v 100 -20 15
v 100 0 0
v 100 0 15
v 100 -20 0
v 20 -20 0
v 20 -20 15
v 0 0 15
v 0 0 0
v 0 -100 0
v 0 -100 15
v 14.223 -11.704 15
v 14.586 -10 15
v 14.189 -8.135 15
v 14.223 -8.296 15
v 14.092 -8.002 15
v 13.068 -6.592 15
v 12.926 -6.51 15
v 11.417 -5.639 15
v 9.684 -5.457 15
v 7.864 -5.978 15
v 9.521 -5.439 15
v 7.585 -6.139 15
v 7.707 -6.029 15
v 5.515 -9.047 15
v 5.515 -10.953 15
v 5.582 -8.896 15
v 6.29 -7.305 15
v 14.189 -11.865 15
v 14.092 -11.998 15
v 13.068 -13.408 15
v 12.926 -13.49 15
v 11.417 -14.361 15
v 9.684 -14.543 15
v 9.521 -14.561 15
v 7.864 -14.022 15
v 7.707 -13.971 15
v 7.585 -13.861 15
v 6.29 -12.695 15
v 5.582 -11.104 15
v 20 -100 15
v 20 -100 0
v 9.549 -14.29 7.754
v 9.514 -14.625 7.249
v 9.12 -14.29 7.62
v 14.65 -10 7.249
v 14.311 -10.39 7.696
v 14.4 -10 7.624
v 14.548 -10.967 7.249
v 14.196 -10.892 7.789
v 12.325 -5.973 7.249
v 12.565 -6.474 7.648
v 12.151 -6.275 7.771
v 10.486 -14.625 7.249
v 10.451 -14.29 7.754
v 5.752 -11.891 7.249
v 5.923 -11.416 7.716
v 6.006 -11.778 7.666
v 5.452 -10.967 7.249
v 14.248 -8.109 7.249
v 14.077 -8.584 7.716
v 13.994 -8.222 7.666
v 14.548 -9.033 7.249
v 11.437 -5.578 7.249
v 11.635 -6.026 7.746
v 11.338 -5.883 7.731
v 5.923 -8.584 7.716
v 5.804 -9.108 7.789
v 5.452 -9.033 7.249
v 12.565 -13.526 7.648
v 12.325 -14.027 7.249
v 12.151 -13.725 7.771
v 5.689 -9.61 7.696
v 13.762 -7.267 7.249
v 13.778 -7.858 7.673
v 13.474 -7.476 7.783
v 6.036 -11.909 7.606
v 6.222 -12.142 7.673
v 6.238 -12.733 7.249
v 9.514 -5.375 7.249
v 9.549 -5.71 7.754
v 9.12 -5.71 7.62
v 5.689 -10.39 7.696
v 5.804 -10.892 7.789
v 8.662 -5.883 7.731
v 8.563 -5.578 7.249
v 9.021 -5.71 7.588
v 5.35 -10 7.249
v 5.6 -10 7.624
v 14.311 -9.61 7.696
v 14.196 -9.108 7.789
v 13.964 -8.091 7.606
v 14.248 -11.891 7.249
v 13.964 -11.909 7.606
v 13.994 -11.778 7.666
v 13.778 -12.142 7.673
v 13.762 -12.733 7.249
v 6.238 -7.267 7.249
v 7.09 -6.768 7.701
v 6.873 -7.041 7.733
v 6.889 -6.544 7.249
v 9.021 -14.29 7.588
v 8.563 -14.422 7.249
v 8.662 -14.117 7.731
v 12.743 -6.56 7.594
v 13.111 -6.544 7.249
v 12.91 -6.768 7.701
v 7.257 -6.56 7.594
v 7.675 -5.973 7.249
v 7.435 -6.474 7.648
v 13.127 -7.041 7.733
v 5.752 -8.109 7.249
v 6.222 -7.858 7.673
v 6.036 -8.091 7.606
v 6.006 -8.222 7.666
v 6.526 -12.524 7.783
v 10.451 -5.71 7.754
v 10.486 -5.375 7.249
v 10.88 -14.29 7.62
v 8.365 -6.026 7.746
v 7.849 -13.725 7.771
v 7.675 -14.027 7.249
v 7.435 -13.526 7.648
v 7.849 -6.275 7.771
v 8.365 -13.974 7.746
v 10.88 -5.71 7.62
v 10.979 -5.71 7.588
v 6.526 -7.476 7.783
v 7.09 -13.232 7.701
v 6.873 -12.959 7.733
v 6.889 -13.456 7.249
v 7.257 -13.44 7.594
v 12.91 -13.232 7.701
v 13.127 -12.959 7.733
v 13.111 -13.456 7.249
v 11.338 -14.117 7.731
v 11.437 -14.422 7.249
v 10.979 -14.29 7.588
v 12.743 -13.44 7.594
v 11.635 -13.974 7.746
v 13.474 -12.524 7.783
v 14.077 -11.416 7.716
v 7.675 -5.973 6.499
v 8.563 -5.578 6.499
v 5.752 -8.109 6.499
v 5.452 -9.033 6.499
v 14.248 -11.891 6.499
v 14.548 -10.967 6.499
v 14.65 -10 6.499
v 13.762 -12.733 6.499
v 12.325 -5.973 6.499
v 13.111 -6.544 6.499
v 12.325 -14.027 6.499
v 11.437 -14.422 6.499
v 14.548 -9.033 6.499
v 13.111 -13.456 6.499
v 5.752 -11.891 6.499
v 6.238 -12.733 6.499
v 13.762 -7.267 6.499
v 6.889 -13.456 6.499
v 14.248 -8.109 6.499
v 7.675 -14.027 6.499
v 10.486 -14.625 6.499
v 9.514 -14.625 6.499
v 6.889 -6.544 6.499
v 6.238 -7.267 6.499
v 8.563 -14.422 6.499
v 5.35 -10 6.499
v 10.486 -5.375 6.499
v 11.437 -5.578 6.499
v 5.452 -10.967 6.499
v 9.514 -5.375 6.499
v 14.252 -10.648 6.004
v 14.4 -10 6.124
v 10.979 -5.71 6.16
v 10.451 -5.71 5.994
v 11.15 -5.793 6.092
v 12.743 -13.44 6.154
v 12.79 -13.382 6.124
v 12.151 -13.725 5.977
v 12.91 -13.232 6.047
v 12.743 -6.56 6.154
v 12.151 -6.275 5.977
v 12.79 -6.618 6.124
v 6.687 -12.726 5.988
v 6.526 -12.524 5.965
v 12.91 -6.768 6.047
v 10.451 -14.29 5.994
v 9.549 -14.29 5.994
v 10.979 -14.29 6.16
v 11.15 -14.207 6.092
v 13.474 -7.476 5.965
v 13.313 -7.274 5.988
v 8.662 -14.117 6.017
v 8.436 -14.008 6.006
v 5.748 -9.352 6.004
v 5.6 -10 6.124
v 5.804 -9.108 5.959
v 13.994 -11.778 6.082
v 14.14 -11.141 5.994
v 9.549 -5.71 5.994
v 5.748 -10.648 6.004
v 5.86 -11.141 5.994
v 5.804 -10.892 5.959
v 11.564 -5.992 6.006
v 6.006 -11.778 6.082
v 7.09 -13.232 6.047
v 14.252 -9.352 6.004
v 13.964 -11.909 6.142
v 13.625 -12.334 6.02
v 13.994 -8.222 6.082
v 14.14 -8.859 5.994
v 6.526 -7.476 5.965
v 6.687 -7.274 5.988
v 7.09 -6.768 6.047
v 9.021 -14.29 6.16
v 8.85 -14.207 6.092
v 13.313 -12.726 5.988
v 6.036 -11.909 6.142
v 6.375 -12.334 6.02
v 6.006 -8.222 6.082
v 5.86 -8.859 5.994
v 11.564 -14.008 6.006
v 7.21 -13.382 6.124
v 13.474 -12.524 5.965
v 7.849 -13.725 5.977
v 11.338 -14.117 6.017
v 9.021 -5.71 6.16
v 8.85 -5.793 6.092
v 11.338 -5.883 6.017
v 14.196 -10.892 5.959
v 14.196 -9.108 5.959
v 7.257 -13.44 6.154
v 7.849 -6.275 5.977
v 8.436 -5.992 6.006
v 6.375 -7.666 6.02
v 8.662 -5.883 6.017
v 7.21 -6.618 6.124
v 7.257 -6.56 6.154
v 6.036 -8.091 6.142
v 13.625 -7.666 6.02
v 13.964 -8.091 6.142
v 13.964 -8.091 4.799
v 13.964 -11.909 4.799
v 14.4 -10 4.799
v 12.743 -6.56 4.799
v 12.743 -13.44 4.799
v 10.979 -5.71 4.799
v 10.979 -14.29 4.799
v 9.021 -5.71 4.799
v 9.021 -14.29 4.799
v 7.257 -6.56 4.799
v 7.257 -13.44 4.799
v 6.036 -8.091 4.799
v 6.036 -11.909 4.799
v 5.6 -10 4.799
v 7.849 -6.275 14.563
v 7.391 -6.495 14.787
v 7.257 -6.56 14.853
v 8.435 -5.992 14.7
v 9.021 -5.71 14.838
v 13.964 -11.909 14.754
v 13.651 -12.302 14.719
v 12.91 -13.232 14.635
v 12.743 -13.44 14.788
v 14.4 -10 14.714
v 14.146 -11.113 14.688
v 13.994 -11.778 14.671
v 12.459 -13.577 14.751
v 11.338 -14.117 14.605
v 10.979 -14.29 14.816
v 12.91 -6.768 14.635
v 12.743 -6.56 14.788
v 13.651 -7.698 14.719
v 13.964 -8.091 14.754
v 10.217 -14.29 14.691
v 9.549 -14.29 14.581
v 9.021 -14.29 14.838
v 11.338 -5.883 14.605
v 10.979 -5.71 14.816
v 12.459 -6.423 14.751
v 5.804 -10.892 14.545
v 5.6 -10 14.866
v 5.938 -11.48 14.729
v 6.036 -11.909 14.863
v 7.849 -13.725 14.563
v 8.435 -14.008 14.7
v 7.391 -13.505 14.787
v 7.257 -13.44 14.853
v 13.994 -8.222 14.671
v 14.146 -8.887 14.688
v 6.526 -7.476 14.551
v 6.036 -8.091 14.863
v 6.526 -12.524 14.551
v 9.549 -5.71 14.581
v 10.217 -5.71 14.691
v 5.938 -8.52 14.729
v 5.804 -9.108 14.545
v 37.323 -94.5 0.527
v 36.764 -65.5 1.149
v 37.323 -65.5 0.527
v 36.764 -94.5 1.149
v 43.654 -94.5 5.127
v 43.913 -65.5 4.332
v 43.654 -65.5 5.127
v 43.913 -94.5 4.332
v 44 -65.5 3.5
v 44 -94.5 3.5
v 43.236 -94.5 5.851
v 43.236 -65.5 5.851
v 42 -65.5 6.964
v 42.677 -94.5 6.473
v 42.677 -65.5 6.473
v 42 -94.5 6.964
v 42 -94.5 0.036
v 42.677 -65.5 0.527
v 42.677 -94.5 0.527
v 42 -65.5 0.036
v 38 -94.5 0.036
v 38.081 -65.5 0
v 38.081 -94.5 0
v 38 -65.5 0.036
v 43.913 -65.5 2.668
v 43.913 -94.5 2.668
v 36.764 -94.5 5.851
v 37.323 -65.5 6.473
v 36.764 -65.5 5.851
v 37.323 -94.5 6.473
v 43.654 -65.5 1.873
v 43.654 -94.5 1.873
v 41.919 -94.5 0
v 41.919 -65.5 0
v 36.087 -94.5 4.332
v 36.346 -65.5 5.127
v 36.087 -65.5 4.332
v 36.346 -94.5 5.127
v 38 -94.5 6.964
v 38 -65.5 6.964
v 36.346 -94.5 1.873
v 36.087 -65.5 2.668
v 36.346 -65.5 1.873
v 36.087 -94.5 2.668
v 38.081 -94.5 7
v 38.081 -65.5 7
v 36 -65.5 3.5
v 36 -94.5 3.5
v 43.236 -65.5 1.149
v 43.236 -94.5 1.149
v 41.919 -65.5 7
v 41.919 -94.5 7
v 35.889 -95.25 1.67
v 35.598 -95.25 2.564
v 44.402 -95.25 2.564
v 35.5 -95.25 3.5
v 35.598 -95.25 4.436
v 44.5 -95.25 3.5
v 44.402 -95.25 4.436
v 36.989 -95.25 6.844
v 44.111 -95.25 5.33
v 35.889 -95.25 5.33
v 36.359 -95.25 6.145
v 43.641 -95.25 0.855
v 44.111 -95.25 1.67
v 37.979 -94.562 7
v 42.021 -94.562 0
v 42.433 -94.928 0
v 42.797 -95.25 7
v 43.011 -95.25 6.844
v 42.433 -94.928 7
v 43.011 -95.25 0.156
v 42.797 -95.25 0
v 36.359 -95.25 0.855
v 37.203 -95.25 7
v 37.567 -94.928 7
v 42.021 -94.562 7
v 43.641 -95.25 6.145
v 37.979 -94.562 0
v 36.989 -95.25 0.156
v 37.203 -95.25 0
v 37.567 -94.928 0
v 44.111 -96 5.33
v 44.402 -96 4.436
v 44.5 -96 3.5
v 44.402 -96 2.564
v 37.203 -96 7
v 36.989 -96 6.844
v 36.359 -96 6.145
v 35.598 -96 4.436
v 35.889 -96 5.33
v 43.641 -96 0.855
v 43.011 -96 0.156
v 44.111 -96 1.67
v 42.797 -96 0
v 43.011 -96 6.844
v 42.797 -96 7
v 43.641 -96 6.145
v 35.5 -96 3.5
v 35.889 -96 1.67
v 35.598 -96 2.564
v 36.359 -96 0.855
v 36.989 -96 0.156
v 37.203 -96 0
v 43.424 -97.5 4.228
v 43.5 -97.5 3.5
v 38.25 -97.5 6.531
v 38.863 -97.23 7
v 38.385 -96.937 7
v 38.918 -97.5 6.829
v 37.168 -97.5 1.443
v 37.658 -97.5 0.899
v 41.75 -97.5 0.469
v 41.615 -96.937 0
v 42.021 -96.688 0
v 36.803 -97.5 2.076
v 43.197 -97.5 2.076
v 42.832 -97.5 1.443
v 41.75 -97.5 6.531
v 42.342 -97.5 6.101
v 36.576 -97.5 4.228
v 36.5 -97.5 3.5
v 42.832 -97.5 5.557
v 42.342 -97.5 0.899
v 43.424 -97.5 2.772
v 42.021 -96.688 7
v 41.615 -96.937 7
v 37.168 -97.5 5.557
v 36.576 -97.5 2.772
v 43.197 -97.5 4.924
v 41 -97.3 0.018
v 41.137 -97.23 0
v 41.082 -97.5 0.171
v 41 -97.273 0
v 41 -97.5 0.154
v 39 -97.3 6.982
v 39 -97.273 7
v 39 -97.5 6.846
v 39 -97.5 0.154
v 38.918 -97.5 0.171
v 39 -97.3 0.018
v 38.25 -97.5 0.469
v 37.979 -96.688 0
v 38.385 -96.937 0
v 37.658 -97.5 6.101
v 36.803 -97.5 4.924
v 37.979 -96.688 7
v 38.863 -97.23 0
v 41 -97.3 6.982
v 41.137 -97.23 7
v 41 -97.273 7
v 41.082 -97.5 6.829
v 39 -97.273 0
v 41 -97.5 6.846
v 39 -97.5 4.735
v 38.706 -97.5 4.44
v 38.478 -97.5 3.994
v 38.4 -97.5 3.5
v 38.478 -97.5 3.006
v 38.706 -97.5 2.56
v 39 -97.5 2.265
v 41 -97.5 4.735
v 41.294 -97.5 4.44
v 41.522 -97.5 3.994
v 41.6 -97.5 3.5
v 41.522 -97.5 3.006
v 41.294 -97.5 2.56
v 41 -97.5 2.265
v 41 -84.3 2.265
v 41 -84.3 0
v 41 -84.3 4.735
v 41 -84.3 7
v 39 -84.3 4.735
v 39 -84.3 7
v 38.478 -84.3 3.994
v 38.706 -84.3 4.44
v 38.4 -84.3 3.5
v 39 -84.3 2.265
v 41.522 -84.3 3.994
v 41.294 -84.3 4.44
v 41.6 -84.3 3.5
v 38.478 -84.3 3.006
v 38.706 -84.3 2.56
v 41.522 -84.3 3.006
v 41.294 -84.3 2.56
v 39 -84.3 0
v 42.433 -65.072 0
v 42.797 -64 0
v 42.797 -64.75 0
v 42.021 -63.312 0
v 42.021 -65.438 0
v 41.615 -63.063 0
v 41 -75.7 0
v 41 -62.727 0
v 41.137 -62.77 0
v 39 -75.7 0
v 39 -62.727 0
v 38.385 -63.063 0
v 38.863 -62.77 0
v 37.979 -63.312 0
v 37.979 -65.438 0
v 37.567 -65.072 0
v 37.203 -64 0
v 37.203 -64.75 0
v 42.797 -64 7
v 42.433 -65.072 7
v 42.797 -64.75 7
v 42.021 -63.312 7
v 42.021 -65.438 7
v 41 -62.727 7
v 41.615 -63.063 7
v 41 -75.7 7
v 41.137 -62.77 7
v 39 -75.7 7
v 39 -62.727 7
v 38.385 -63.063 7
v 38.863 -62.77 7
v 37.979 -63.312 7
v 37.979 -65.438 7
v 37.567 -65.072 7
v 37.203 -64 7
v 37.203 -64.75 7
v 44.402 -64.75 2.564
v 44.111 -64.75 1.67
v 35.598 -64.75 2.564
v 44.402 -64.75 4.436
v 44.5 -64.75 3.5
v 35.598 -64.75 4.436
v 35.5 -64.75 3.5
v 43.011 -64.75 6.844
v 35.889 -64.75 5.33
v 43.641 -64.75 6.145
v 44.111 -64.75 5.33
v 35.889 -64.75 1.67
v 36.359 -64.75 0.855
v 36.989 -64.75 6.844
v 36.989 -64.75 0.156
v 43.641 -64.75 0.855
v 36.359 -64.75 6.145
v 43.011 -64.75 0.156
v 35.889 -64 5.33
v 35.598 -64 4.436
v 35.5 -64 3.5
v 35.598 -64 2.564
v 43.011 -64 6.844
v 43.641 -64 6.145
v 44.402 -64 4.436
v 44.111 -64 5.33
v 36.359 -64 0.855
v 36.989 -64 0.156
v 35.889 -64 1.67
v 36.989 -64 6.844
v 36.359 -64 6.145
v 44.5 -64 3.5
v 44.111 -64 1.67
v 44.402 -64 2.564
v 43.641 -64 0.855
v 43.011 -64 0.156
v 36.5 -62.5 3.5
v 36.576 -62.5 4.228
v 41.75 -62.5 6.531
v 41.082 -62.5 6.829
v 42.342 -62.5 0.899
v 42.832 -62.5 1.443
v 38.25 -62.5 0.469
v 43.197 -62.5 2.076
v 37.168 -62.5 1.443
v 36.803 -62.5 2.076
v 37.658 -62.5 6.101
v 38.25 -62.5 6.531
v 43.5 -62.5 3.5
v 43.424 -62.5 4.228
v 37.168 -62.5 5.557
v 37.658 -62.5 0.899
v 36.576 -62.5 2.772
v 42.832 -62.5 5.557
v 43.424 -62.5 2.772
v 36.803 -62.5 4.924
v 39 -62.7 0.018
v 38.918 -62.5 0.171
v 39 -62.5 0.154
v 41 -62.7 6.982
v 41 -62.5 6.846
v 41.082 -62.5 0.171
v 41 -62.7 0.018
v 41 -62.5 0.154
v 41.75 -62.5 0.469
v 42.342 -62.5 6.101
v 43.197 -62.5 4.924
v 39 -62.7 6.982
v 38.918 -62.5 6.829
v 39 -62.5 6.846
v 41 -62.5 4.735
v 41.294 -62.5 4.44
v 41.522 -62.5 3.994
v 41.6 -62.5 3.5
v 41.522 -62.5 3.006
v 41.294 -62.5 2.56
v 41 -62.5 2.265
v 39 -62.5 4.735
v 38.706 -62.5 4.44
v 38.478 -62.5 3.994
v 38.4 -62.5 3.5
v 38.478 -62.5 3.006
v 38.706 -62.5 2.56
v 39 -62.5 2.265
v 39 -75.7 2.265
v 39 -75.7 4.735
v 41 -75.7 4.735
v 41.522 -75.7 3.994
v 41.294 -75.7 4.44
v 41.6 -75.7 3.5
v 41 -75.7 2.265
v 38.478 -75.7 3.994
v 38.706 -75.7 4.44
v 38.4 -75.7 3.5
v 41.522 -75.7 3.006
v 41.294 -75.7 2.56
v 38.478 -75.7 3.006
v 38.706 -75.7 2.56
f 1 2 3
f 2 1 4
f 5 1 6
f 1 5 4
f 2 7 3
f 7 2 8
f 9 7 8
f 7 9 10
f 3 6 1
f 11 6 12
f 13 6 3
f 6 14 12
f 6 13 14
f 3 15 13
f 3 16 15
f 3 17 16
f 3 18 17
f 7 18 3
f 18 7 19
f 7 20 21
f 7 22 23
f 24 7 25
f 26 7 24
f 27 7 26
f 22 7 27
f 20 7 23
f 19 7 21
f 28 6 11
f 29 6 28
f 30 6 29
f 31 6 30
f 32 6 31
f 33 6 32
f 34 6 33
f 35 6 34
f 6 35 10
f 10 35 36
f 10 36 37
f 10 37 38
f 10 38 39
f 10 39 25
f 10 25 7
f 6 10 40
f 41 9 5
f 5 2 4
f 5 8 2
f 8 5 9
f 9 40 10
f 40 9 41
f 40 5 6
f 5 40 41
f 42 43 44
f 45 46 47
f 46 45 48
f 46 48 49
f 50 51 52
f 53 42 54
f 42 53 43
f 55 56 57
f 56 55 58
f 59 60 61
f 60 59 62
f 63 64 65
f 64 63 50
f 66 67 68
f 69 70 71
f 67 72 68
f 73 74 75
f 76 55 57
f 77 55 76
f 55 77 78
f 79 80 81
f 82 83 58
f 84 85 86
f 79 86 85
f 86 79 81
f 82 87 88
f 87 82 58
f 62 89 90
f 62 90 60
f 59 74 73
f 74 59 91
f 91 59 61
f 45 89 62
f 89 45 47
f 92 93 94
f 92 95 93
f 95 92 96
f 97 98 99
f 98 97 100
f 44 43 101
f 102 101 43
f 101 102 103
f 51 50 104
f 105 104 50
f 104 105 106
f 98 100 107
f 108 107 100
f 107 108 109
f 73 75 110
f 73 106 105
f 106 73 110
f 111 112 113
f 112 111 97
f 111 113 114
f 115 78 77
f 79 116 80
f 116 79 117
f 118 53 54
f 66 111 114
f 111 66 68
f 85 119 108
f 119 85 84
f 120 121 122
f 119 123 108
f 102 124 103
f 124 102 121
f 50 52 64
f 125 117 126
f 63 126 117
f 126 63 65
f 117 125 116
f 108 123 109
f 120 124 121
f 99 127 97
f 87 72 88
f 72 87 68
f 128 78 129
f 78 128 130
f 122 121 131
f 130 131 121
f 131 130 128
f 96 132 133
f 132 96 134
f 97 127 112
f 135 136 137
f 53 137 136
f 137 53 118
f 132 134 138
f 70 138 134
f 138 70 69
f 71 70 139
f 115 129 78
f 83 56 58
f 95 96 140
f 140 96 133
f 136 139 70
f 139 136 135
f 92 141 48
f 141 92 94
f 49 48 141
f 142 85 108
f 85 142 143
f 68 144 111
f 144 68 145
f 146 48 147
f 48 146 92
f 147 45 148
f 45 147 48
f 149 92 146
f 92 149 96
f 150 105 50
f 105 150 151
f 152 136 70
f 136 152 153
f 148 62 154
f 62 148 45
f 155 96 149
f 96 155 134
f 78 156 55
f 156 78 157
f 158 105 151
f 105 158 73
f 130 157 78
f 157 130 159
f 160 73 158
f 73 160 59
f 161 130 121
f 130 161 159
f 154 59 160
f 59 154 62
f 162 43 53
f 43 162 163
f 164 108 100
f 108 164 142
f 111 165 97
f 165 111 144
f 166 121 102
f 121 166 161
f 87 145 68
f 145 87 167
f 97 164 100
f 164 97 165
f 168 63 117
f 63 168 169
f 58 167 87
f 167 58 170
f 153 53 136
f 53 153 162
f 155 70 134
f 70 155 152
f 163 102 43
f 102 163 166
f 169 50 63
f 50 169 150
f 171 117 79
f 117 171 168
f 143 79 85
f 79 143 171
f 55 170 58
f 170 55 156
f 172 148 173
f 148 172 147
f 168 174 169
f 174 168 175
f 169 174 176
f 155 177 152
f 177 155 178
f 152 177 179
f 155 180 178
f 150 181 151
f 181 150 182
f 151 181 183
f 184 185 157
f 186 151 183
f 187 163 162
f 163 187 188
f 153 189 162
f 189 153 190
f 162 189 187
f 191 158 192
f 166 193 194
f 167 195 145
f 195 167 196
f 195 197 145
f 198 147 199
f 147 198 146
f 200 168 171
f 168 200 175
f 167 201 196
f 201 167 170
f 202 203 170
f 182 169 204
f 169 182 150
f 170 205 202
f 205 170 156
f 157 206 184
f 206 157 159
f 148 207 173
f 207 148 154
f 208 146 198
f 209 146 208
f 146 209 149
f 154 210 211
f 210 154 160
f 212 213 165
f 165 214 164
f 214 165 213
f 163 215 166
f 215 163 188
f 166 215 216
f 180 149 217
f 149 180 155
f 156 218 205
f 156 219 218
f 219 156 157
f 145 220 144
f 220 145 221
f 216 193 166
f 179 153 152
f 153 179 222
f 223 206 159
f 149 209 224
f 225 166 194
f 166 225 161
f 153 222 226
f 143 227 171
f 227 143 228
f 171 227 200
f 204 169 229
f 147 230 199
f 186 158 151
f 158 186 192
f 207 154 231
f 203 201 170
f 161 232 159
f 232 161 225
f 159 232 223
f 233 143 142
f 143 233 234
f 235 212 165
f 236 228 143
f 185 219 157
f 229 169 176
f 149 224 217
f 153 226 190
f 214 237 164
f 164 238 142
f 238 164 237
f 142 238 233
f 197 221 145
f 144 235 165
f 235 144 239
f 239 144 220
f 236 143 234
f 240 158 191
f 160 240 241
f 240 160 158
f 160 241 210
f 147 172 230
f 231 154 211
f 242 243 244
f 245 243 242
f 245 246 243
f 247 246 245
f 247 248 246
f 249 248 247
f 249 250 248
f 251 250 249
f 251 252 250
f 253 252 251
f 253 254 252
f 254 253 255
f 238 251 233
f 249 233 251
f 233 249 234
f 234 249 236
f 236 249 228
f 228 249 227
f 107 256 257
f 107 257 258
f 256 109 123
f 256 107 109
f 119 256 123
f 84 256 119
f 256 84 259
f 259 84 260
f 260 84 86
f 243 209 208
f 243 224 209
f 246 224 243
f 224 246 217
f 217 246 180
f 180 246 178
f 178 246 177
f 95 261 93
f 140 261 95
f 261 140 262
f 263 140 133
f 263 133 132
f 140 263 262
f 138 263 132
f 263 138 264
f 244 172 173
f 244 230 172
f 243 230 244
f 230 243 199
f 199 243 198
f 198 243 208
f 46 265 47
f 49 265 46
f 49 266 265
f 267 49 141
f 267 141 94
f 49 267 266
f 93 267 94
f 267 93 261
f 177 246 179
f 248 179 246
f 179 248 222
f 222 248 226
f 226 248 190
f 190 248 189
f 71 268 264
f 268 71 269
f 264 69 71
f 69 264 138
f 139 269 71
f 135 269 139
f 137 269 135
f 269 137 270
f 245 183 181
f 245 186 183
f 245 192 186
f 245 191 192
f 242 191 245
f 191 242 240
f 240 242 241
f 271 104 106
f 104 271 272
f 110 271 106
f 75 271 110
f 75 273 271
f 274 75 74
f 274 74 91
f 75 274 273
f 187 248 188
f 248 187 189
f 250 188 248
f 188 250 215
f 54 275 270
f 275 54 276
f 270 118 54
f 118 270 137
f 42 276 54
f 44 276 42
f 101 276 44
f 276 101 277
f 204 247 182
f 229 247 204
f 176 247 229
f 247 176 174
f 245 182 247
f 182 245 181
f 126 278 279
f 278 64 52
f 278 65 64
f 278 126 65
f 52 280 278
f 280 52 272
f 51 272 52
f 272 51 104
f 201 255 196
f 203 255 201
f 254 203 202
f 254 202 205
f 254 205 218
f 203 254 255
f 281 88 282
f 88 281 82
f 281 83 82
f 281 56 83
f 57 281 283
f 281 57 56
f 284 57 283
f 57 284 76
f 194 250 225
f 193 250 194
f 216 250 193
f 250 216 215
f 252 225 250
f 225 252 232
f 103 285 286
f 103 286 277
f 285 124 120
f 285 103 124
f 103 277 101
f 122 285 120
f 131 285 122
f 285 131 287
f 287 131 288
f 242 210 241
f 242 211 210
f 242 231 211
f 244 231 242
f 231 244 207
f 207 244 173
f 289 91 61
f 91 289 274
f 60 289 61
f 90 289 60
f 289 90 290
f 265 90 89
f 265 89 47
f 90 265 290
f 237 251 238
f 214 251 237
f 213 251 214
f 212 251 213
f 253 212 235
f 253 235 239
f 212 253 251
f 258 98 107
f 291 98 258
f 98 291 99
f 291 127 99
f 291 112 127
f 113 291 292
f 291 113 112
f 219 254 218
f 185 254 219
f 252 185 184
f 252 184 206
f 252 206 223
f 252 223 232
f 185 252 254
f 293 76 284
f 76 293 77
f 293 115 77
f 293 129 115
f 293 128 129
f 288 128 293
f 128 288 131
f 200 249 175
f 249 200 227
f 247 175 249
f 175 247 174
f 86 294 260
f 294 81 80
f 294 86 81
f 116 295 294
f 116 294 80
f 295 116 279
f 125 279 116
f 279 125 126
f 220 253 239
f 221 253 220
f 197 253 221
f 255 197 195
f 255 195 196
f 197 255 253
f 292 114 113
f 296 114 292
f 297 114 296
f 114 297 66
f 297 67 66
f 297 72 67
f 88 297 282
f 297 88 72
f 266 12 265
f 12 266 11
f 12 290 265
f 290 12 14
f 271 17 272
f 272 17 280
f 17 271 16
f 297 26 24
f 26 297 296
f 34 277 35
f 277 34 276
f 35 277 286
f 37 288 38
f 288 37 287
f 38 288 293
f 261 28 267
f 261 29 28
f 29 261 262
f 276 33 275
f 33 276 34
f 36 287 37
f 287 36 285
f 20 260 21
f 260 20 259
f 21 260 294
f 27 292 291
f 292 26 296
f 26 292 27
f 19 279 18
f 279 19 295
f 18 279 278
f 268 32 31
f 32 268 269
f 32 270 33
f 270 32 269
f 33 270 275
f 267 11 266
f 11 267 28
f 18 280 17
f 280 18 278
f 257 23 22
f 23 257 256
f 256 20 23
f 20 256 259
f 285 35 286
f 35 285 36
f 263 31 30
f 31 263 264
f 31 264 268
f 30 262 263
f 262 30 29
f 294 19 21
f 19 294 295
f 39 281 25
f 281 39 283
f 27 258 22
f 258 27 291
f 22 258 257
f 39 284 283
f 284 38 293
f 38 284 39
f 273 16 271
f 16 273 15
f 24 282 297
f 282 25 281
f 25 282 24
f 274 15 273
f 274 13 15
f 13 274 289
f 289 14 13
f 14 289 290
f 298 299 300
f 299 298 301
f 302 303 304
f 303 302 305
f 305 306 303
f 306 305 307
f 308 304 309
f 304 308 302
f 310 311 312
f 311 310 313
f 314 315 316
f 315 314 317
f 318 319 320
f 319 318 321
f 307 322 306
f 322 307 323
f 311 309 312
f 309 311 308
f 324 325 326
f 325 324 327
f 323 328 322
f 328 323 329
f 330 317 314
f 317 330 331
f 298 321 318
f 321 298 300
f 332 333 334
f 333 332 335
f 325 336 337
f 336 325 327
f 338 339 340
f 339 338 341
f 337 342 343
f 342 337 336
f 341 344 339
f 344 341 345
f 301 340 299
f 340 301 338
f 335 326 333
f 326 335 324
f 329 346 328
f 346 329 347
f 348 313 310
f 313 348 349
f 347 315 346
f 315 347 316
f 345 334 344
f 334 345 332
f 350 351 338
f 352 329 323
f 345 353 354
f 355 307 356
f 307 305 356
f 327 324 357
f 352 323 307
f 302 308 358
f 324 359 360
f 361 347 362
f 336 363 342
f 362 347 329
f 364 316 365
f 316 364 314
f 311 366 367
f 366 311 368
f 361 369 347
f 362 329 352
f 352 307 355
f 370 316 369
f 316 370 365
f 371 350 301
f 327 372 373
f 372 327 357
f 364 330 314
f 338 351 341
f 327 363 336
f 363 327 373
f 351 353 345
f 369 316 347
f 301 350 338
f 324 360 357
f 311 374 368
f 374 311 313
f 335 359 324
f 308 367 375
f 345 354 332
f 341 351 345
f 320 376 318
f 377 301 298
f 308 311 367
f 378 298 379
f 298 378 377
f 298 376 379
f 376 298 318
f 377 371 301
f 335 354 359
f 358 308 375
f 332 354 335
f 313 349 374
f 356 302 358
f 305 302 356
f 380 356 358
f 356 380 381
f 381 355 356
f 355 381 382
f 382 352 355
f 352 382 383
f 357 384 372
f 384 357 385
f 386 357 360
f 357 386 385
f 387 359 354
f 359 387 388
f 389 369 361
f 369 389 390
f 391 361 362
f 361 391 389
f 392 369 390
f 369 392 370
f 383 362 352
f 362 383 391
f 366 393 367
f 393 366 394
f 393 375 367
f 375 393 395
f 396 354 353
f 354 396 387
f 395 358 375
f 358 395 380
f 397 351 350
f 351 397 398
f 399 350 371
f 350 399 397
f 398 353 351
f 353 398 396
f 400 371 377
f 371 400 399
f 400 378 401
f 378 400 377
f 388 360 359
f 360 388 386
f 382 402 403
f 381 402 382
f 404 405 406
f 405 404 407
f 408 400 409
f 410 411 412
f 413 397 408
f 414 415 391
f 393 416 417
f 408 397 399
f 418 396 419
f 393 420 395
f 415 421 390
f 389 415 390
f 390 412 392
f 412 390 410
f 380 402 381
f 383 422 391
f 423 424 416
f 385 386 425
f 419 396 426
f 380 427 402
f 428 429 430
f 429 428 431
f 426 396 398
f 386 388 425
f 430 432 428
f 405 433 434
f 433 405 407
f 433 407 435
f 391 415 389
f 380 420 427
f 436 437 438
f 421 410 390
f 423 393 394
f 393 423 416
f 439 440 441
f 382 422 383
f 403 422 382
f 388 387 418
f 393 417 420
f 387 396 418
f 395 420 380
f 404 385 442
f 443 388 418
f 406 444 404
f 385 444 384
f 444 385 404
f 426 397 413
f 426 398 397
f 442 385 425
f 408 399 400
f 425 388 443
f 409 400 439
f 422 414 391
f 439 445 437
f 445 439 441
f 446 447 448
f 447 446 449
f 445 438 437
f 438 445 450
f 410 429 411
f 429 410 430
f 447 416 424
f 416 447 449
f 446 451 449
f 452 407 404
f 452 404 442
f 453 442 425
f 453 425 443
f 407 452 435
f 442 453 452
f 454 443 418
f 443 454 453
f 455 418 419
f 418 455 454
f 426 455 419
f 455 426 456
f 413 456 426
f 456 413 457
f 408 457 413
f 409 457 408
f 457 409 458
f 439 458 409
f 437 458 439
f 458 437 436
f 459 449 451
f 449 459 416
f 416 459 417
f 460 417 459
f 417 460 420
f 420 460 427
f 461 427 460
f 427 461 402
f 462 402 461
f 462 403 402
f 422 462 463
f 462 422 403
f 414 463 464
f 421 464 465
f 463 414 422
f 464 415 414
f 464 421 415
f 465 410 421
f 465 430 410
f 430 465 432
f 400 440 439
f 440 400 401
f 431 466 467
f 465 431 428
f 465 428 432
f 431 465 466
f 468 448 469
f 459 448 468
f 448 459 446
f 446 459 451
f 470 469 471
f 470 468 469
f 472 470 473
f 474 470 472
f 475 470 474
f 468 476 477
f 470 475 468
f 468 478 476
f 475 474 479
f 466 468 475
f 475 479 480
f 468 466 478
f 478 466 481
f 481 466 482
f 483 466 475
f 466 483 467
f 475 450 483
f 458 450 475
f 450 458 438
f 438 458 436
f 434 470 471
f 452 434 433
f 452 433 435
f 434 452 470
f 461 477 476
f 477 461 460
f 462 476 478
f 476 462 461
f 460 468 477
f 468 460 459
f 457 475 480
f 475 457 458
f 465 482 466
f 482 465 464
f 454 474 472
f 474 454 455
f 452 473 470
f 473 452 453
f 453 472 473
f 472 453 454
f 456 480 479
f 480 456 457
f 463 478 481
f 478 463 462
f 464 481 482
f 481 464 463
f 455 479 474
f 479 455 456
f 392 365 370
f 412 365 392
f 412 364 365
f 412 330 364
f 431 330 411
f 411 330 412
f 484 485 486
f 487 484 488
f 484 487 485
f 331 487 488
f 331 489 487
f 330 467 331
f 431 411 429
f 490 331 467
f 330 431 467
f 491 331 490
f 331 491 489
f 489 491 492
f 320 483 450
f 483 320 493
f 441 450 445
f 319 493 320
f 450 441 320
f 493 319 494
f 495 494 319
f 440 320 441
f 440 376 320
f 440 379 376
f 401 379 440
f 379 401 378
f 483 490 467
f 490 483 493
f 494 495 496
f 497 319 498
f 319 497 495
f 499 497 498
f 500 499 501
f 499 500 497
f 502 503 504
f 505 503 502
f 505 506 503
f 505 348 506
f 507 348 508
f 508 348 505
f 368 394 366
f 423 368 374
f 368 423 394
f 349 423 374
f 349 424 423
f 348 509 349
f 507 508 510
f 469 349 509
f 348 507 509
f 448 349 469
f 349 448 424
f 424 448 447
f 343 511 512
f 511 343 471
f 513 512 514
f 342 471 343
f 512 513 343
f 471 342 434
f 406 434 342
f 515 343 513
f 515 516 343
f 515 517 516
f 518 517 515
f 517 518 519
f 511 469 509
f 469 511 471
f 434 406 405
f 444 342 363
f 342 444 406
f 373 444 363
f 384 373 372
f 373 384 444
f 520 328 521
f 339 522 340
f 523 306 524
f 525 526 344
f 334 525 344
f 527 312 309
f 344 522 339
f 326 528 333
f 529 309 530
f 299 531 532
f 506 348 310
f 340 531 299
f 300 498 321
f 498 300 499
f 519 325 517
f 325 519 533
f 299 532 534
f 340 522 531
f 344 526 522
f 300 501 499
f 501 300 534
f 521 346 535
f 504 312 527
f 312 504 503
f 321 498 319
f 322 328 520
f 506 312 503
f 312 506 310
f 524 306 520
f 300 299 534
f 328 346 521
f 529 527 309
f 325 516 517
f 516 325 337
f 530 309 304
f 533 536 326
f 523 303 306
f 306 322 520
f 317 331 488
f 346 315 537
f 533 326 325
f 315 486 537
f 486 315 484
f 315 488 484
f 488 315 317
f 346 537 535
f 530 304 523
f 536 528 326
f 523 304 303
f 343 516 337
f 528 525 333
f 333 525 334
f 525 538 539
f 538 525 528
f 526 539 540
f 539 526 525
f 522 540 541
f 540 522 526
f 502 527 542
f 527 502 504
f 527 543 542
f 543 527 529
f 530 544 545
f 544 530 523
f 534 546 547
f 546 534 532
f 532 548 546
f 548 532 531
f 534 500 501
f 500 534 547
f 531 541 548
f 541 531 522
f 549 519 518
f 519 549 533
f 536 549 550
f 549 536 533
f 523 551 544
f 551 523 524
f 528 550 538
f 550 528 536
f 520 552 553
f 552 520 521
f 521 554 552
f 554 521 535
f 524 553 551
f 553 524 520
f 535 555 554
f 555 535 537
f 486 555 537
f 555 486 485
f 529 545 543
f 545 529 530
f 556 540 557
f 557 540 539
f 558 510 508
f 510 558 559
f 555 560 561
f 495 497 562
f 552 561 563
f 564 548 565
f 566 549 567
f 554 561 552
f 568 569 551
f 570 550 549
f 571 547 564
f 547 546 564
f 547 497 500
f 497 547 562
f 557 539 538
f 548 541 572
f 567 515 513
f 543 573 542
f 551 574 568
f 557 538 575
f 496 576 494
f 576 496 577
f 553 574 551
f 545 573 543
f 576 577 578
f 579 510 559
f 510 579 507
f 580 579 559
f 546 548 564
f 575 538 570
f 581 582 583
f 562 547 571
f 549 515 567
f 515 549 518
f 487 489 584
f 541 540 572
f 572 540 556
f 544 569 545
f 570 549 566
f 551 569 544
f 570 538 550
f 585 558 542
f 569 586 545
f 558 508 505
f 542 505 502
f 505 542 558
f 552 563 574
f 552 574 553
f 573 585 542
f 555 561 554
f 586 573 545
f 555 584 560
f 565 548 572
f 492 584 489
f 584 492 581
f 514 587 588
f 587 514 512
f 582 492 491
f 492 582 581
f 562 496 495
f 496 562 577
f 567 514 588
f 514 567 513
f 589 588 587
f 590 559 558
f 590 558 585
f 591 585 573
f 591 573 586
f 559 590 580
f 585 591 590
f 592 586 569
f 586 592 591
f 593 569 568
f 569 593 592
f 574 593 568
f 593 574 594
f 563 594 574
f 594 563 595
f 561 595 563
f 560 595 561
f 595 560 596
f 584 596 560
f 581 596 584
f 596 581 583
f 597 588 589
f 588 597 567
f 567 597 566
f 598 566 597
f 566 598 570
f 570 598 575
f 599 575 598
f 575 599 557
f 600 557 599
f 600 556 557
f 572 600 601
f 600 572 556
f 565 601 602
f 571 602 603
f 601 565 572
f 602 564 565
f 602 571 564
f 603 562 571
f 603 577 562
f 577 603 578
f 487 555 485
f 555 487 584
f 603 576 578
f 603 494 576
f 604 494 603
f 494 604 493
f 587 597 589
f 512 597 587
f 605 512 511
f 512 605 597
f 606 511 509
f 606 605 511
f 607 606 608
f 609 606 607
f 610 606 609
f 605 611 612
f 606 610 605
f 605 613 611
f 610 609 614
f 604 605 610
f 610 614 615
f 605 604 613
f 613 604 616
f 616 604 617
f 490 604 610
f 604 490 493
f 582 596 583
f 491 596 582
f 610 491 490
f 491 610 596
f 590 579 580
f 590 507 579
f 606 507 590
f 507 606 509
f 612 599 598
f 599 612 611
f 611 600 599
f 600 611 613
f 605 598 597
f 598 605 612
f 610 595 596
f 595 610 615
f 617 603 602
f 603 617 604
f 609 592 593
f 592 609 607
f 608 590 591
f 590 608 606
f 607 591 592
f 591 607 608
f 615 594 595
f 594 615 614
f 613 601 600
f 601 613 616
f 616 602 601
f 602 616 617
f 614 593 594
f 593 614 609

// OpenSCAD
// Pin Connectors V2
// Tony Buser <tbuser@gmail.com>
// From http://www.thingiverse.com/thing:10541

// pinhole(h=5);

translate([0, 0, 15]) difference() {
  translate([0, 0, -15]) rotate([90, 0, 0]) union() {
    cube(size=[100, 15, 20]);
    translate([20, 0, 0]) rotate([0, -90, 0]) cube(size=[100, 15, 20]);
  }
  rotate([180, 0, 0]) translate([10, 10, 0.001]) pinhole(h=10, tight=false);
}

translate([40, -80, 0]) pinpeg(h=35, tight=false);

rotate([180, 0, 0]) translate([40, 40, -15]) difference() {
  rotate_extrude(file="pulley-side.dxf");
  pinhole(h=10, tight=false);
}

// test();
// pintack(h=10);
// pinpeg(h=20);

module test() {
  tolerance = 0.3;
  
  translate([-12, 12, 0]) pinpeg(h=20);
  translate([12, 12, 0]) pintack(h=10);
  
  difference() {
    union() {
      translate([0, -12, 2.5]) cube(size = [59, 20, 5], center = true);
      translate([24, -12, 7.5]) cube(size = [12, 20, 15], center = true);
    }
    translate([-24, -12, 0]) pinhole(h=5, t=tolerance);
    translate([-12, -12, 0]) pinhole(h=5, t=tolerance, tight=false);
    translate([0, -12, 0]) pinhole(h=10, t=tolerance);
    translate([12, -12, 0]) pinhole(h=10, t=tolerance, tight=false);
    translate([24, -12, 15]) rotate([0, 180, 0]) pinhole(h=10, t=tolerance);
  }
}

module pinhole(h=10, r=4, lh=3, lt=1, t=0.3, tight=true) {
  // h = shaft height
  // r = shaft radius
  // lh = lip height
  // lt = lip thickness
  // t = tolerance
  // tight = set to false if you want a joint that spins easily
  
  union() {
    pin_solid(h, r+(t/2), lh, lt);
    cylinder(h=h+0.2, r=r);
    // widen the cylinder slightly
    // cylinder(h=h+0.2, r=r+(t-0.2/2));
    if (tight == false) {
      cylinder(h=h+0.2, r=r+(t/2)+0.25);
    }
    // widen the entrance hole to make insertion easier
    translate([0, 0, -0.1]) cylinder(h=lh/3, r2=r, r1=r+(t/2)+(lt/2));
  }
}

module pin(h=10, r=4, lh=3, lt=1, side=false) {
  // h = shaft height
  // r = shaft radius
  // lh = lip height
  // lt = lip thickness
  // side = set to true if you want it printed horizontally

  if (side) {
    pin_horizontal(h, r, lh, lt);
  } else {
    pin_vertical(h, r, lh, lt);
  }
}

module pintack(h=10, r=4, lh=3, lt=1, bh=3, br=8.75) {
  // bh = base_height
  // br = base_radius
  
  union() {
    cylinder(h=bh, r=br);
    translate([0, 0, bh]) pin(h, r, lh, lt);
  }
}

module pinpeg(h=20, r=4, lh=3, lt=1) {
  union() {
    translate([0, -h/4+0.05, 0]) pin(h/2+0.1, r, lh, lt, side=true);
    translate([0, h/4-0.05, 0]) rotate([0, 0, 180]) pin(h/2+0.1, r, lh, lt, side=true);
  }
}

// just call pin instead, I made this module because it was easier to do the rotation option this way
// since openscad complains of recursion if I did it all in one module
module pin_vertical(h=10, r=4, lh=3, lt=1) {
  // h = shaft height
  // r = shaft radius
  // lh = lip height
  // lt = lip thickness

  difference() {
    pin_solid(h, r, lh, lt);
    
    // center cut
    translate([-r*0.5/2, -(r*2+lt*2)/2, h/4]) cube([r*0.5, r*2+lt*2, h]);
    translate([0, 0, h/4]) cylinder(h=h+lh, r=r/2.5, $fn=20);
    // center curve
    // translate([0, 0, h/4]) rotate([90, 0, 0]) cylinder(h=r*2, r=r*0.5/2, center=true, $fn=20);
  
    // side cuts
    translate([-r*2, -lt-r*1.125, -1]) cube([r*4, lt*2, h+2]);
    translate([-r*2, -lt+r*1.125, -1]) cube([r*4, lt*2, h+2]);
  }
}

// call pin with side=true instead of this
module pin_horizontal(h=10, r=4, lh=3, lt=1) {
  // h = shaft height
  // r = shaft radius
  // lh = lip height
  // lt = lip thickness
  translate([0, h/2, r*1.125-lt]) rotate([90, 0, 0]) pin_vertical(h, r, lh, lt);
}

// this is mainly to make the pinhole module easier
module pin_solid(h=10, r=4, lh=3, lt=1) {
  union() {
    // shaft
    cylinder(h=h-lh, r=r, $fn=30);
    // lip
    // translate([0, 0, h-lh]) cylinder(h=lh*0.25, r1=r, r2=r+(lt/2), $fn=30);
    // translate([0, 0, h-lh+lh*0.25]) cylinder(h=lh*0.25, r2=r, r1=r+(lt/2), $fn=30);
    // translate([0, 0, h-lh+lh*0.50]) cylinder(h=lh*0.50, r1=r, r2=r-(lt/2), $fn=30);

    // translate([0, 0, h-lh]) cylinder(h=lh*0.50, r1=r, r2=r+(lt/2), $fn=30);
    // translate([0, 0, h-lh+lh*0.50]) cylinder(h=lh*0.50, r1=r+(lt/2), r2=r-(lt/3), $fn=30);    

    translate([0, 0, h-lh]) cylinder(h=lh*0.25, r1=r, r2=r+(lt/2), $fn=30);
    translate([0, 0, h-lh+lh*0.25]) cylinder(h=lh*0.25, r=r+(lt/2), $fn=30);    
    translate([0, 0, h-lh+lh*0.50]) cylinder(h=lh*0.50, r1=r+(lt/2), r2=r-(lt/2), $fn=30);    

    // translate([0, 0, h-lh]) cylinder(h=lh, r1=r+(lt/2), r2=1, $fn=30);
    // translate([0, 0, h-lh-lt/2]) cylinder(h=lt/2, r1=r, r2=r+(lt/2), $fn=30);
  }
}
